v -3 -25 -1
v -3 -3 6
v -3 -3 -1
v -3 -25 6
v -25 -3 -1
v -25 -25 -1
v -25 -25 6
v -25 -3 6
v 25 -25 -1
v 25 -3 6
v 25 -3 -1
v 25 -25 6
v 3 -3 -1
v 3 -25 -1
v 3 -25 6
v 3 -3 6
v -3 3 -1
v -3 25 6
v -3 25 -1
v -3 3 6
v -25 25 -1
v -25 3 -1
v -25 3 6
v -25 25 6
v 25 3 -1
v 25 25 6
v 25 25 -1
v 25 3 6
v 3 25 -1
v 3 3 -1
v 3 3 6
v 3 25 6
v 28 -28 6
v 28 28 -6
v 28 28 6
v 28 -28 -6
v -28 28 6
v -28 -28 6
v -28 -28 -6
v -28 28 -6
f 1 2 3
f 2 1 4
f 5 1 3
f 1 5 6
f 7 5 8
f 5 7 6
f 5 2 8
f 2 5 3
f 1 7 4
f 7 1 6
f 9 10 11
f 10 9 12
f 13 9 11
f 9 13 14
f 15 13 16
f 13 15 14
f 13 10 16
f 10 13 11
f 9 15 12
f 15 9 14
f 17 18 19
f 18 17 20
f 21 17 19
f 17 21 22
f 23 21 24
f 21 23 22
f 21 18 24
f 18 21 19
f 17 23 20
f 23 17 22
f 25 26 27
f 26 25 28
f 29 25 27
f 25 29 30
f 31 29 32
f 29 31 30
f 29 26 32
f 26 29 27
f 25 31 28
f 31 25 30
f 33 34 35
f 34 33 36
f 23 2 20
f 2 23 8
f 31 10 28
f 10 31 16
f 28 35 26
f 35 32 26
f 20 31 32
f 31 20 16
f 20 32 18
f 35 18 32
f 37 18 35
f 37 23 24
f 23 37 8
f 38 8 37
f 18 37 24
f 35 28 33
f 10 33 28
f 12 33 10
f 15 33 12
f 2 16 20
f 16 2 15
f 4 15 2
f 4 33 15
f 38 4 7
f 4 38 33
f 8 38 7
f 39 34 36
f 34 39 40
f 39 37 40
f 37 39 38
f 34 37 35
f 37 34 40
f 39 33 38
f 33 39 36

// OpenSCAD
$fn = 32;

// ----------------------------------------------------------------------
// Pocket plate 56 x 56 x 12
// 2 x 2 pockets 22 mm square, 7 mm deep
// ----------------------------------------------------------------------

// --- parameters (mm) ---
thickness = 12;  // plate thickness
floor_t = 5;     // material left under each pocket
pocket = 22;     // pocket side length
pitch_x = 28;    // pocket pitch along X
pitch_y = 28;    // pocket pitch along Y
cols = 2;        // pockets per row
rows = 2;        // rows of pockets

// --- derived feature positions (mm) ---
depth = thickness - floor_t;        // = 7   pocket depth, down to the floor
span_x = (cols - 1) * pitch_x;      // = 28   distance between outer pockets
span_y = (rows - 1) * pitch_y;      // = 28   distance between outer pocket rows
origin_x = -span_x / 2;             // = -14   X of the first pocket
origin_y = -span_y / 2;             // = -14   Y of the first pocket
plate = [span_x + pocket + 6, span_y + pocket + 6, thickness];  // = [56, 56, 12]   overall size: pockets plus 3 mm of wall on each side
feature_centers = [
  [origin_x + 0 * pitch_x, origin_y + 0 * pitch_y],
  [origin_x + 1 * pitch_x, origin_y + 0 * pitch_y],
  [origin_x + 0 * pitch_x, origin_y + 1 * pitch_y],
  [origin_x + 1 * pitch_x, origin_y + 1 * pitch_y]
];   // pocket centres, used verbatim by the cutter loop

// plate outline, then one pocket per centre in feature_centers
difference() {
  cube(plate, center = true);
  for (centre = feature_centers)
    translate([centre[0] - pocket / 2, centre[1] - pocket / 2, plate[2] / 2 - depth])
      cube([pocket, pocket, depth + 1]);  // centred on the declared pocket centre
}
